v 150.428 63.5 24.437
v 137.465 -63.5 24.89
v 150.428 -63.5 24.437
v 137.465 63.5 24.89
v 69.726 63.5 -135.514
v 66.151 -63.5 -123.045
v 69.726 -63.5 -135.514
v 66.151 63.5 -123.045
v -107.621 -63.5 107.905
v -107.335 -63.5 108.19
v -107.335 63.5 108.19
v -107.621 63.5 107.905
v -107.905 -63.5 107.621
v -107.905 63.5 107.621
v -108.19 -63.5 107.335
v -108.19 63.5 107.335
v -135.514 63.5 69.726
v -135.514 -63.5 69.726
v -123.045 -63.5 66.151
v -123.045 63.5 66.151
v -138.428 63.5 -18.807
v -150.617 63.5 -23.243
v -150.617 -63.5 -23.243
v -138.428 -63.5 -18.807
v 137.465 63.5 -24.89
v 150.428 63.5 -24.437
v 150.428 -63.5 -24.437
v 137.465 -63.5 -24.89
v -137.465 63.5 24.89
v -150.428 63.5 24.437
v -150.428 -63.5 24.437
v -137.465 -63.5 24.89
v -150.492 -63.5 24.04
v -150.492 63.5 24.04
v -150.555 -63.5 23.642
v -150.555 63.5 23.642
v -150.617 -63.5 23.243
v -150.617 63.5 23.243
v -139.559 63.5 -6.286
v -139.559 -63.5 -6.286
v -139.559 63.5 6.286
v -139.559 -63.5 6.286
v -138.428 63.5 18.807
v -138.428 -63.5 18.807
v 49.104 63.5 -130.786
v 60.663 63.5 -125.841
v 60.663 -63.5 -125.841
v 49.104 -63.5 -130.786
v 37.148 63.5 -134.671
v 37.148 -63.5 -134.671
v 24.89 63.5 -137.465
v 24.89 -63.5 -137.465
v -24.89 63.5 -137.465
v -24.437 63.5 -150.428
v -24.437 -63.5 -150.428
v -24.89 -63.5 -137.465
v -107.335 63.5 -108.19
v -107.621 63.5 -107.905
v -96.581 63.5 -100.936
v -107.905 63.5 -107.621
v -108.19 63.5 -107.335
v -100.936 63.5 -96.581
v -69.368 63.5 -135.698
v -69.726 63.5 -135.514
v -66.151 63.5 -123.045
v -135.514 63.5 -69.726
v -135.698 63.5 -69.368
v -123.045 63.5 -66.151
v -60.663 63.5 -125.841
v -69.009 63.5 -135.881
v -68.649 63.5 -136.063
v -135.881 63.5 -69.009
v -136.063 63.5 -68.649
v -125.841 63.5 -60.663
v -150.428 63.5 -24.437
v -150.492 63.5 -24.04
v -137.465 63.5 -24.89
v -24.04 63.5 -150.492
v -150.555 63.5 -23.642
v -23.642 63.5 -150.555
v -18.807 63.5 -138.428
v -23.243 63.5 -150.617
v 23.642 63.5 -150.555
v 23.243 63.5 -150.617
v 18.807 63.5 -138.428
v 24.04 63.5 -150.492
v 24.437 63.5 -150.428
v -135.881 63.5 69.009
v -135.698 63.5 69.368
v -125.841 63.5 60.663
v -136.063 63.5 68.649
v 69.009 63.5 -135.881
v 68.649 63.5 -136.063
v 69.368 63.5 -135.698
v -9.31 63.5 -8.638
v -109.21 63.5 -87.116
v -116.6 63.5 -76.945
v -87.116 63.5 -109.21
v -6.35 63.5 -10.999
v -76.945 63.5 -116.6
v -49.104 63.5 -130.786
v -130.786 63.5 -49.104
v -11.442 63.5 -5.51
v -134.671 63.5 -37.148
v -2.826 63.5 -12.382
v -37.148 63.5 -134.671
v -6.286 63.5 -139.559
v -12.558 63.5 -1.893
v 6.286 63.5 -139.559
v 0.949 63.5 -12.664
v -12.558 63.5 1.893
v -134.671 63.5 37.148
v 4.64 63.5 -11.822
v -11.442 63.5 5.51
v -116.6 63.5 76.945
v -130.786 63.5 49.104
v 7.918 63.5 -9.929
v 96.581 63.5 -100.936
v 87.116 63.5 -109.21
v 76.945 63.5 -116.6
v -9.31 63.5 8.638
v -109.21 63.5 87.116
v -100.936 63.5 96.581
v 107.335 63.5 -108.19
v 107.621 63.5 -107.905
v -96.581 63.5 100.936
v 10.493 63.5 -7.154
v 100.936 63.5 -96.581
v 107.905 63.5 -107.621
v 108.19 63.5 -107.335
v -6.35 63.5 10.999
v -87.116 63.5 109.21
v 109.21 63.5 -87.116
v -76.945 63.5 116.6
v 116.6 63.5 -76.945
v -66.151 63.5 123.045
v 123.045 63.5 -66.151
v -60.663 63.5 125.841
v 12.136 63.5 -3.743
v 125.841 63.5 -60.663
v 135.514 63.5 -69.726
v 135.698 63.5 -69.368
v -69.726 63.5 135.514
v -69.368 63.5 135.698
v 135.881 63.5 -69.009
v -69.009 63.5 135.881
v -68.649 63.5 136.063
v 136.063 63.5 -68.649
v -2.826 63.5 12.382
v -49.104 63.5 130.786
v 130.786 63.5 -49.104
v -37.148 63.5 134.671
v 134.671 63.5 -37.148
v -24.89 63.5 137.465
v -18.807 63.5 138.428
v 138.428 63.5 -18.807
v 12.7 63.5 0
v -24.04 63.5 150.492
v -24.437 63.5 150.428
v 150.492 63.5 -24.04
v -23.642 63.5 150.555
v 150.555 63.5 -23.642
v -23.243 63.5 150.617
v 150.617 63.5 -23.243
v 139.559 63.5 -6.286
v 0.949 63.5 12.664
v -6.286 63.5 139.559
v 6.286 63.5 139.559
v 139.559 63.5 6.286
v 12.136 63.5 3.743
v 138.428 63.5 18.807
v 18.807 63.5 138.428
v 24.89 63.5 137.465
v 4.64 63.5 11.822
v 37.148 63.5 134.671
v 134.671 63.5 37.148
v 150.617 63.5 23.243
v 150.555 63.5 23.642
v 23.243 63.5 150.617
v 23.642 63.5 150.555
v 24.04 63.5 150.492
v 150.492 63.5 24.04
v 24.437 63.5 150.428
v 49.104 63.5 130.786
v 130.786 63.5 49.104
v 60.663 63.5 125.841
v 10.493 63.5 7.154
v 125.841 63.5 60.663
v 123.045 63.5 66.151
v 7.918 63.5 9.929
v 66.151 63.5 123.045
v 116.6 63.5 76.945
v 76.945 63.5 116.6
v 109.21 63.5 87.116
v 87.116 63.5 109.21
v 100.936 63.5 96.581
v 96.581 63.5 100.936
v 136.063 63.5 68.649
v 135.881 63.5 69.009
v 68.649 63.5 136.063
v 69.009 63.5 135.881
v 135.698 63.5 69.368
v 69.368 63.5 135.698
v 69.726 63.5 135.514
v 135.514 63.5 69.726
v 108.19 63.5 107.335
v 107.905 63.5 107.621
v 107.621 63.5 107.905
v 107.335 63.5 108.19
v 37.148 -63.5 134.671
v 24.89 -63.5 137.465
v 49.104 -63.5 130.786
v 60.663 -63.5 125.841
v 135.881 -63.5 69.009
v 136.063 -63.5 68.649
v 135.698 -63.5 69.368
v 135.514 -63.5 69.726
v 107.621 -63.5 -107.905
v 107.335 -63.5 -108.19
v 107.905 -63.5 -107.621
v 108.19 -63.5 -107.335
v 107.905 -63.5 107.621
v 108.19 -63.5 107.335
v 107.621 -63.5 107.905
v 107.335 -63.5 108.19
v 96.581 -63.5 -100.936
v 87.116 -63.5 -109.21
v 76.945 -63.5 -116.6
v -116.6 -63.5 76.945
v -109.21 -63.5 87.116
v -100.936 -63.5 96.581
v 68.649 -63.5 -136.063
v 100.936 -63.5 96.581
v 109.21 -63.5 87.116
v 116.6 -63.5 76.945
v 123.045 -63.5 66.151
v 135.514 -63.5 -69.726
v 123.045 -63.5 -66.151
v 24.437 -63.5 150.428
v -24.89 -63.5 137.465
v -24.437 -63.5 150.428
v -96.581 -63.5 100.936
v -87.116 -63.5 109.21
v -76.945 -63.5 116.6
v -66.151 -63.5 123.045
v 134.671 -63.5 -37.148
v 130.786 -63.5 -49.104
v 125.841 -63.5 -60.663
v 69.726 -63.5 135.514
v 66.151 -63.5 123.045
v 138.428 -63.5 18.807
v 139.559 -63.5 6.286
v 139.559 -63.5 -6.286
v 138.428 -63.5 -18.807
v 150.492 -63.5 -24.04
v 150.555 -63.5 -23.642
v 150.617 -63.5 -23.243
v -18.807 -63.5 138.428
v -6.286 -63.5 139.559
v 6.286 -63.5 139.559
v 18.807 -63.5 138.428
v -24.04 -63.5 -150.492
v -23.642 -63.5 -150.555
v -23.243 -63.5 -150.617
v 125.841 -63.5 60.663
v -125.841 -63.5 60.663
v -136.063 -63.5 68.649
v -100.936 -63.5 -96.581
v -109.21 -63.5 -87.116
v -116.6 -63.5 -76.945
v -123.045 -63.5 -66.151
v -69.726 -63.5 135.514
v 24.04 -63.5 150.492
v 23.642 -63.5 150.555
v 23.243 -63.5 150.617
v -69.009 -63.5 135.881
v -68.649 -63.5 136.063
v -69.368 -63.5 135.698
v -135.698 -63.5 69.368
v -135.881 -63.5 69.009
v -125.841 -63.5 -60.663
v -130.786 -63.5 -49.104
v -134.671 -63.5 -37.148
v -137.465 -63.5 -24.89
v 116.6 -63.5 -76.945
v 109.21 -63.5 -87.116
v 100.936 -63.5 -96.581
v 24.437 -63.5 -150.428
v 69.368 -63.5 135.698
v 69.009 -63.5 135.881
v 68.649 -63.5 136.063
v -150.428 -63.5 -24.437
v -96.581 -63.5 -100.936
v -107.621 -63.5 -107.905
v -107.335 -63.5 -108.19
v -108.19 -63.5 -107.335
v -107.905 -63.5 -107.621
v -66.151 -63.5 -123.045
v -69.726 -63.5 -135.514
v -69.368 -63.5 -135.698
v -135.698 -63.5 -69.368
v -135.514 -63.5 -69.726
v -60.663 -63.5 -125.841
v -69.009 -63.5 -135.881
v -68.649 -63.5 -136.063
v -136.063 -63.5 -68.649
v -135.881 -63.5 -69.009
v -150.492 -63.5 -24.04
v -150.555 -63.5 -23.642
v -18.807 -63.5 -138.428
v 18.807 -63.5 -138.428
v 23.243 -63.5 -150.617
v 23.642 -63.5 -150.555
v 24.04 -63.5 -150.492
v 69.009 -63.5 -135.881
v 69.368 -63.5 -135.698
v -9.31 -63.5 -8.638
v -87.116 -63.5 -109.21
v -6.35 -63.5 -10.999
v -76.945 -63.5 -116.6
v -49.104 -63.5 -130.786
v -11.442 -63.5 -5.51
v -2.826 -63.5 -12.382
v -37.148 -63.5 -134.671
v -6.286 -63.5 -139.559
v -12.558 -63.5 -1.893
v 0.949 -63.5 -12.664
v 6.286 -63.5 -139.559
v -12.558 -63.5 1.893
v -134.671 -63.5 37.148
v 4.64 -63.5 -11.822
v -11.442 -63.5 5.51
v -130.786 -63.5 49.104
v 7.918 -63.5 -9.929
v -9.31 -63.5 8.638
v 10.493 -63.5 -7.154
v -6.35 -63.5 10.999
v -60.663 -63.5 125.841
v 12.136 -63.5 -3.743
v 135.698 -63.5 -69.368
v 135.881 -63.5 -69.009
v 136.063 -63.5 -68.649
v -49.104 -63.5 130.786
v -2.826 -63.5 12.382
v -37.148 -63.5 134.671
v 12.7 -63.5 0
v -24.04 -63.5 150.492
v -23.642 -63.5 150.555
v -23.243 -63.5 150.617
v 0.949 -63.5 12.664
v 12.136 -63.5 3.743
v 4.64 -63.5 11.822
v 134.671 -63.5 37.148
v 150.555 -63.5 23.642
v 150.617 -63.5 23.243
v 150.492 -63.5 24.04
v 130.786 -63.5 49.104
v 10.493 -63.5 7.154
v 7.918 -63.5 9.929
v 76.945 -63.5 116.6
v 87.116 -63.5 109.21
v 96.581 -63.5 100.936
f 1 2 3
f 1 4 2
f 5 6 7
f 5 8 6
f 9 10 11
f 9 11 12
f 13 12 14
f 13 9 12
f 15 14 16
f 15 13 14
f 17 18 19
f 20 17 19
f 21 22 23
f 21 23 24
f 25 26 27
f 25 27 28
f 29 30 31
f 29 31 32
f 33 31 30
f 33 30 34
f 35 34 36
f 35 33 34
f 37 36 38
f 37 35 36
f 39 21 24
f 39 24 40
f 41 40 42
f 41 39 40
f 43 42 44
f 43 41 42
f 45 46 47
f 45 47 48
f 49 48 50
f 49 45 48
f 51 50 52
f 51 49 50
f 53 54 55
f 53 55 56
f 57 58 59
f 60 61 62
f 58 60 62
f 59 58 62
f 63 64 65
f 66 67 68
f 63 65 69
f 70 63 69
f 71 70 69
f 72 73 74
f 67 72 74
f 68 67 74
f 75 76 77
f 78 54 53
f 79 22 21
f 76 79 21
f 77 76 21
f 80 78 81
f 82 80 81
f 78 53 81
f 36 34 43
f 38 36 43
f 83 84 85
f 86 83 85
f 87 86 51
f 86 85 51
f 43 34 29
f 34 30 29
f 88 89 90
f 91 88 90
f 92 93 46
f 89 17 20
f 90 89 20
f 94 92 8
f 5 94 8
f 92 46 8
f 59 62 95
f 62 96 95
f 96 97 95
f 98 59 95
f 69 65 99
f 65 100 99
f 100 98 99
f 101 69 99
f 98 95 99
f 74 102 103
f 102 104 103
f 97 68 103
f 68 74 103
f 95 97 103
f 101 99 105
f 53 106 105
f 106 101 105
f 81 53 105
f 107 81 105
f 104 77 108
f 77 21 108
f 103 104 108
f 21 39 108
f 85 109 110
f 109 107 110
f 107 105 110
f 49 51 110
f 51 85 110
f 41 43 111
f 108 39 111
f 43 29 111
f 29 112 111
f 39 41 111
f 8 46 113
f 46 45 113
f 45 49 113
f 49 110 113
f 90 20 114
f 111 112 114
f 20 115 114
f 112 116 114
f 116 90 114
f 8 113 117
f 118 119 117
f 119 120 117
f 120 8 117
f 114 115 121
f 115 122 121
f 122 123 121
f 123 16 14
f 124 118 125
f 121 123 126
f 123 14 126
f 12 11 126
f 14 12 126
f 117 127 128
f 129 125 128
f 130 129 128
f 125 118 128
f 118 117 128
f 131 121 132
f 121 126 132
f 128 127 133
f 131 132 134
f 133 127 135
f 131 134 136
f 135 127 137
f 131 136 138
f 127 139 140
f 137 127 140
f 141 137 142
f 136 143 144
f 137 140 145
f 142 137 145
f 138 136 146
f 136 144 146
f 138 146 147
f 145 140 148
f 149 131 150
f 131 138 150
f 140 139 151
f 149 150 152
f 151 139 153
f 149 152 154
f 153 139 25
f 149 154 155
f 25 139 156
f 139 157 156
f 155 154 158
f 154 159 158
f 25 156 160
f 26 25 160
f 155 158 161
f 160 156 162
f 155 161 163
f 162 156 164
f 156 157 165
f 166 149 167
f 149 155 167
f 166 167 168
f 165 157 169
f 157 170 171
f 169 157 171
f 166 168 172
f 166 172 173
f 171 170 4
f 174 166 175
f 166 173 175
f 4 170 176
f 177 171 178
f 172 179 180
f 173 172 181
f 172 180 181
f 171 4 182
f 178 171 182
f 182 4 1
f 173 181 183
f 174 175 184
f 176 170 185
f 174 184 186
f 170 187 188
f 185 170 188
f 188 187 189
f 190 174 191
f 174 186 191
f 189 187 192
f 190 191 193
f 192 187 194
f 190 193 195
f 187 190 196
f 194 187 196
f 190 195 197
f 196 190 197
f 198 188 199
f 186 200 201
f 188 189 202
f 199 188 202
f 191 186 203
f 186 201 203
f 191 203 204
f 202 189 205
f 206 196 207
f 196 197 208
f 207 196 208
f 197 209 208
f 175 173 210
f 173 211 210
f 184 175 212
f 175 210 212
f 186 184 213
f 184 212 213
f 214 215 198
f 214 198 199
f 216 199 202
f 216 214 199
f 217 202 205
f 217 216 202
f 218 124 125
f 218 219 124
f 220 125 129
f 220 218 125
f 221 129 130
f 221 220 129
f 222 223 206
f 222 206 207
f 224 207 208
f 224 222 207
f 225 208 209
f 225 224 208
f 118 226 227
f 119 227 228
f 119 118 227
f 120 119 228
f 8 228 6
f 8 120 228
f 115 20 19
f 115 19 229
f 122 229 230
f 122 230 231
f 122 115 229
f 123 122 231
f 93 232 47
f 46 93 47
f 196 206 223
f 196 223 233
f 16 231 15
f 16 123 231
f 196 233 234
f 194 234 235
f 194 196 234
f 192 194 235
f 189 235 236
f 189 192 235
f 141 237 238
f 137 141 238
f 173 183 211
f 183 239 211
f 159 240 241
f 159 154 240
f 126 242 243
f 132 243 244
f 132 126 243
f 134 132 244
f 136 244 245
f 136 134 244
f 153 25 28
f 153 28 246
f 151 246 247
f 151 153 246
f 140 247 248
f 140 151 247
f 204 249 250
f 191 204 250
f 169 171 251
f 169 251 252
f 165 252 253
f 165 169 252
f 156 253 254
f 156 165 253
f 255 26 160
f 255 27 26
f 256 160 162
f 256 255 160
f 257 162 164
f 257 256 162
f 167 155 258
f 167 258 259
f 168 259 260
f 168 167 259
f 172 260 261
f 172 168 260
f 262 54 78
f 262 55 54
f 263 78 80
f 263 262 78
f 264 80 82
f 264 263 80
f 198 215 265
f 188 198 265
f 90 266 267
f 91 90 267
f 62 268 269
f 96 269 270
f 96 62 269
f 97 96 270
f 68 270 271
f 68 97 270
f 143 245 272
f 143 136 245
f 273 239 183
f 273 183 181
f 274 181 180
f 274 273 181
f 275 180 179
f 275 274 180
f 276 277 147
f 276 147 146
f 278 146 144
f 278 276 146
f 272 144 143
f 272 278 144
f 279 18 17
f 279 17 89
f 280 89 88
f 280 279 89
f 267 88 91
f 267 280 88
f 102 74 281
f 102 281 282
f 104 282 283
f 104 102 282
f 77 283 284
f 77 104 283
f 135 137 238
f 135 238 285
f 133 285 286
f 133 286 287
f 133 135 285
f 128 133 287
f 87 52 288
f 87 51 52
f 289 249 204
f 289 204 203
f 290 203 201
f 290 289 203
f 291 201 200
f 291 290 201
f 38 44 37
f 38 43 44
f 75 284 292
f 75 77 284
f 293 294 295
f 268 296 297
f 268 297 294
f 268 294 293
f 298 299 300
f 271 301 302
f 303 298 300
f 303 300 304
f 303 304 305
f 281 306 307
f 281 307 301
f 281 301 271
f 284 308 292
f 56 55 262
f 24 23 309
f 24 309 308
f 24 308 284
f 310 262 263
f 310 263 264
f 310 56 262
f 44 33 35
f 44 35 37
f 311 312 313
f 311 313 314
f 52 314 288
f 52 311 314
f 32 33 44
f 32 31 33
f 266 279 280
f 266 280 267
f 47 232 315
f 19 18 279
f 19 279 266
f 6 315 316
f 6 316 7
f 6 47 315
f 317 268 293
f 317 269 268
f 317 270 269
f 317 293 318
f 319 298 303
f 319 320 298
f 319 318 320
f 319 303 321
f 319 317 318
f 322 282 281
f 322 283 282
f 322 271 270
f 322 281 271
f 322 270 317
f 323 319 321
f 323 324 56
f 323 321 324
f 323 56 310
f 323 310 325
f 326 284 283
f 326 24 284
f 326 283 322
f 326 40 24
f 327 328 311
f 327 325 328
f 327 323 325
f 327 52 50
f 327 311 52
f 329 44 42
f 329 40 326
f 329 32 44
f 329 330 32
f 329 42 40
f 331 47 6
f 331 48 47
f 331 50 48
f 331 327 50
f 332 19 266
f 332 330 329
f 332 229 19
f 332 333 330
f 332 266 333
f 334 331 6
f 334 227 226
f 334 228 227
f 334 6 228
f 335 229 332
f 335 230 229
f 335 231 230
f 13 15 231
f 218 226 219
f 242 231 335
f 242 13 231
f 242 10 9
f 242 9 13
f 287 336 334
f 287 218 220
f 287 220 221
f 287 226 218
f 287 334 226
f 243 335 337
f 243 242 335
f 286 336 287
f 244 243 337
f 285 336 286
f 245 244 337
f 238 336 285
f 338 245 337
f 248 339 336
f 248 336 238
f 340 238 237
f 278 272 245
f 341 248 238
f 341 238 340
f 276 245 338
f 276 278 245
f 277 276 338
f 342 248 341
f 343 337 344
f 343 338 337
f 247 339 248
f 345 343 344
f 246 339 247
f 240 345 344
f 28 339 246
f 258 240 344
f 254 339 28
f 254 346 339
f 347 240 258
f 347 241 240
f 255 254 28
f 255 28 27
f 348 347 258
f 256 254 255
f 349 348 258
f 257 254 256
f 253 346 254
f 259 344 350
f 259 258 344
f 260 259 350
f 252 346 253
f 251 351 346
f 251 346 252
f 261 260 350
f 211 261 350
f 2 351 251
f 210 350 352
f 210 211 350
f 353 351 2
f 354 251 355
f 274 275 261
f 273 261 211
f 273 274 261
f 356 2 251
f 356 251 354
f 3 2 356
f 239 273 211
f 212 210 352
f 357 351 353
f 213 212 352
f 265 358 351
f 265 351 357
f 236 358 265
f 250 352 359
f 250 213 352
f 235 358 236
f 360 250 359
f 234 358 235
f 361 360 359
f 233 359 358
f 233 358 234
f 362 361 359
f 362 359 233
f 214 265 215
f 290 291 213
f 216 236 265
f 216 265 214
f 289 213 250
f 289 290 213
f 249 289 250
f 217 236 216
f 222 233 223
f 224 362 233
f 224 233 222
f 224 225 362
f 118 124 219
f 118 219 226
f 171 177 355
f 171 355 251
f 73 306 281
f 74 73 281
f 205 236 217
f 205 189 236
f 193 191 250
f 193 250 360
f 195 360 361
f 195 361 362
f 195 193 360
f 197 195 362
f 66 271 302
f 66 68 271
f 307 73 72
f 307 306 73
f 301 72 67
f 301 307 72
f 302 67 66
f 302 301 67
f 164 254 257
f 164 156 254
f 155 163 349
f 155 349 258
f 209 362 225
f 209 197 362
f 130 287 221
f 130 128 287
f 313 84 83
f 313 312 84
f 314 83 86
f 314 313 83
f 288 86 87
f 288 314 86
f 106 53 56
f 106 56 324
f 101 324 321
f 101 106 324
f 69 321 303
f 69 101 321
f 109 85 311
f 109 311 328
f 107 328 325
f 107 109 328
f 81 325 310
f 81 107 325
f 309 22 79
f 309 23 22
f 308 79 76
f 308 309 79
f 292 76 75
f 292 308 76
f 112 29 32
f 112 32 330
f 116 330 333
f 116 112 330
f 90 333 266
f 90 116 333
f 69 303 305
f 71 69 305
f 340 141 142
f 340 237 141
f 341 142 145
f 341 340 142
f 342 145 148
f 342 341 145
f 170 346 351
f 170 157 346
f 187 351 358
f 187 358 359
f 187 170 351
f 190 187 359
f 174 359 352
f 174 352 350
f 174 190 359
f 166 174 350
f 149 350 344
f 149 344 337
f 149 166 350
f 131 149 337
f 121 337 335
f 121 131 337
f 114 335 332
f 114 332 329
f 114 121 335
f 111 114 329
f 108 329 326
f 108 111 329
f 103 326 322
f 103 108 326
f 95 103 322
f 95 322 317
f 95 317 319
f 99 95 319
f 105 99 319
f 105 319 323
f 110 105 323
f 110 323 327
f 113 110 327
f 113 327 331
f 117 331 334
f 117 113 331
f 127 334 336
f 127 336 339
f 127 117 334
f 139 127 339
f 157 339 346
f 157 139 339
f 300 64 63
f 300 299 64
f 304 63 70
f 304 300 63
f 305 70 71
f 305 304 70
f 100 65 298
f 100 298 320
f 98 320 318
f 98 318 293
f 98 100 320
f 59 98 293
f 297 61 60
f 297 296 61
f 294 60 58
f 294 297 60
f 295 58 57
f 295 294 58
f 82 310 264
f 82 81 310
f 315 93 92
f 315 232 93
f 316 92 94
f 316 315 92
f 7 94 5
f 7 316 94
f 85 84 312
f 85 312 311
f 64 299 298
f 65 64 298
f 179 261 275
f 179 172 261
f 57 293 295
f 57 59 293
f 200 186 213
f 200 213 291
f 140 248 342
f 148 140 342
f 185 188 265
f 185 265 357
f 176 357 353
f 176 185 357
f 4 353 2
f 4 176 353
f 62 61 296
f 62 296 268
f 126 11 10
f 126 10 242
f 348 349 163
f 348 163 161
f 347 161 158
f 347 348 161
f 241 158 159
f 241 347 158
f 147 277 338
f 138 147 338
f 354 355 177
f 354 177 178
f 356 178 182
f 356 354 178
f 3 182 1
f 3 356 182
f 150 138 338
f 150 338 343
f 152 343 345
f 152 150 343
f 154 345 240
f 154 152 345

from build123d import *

# Parameters (mm, degrees)
F0_R     = 152.4
F0_R_2   = 76.2
F0_R_3   = 12.7
F1_DEPTH = 63.5
F3_DEPTH = 63.5


with BuildPart() as f1:
    # F0 (on Front) → F1 (new body, symmetric)
    with BuildSketch(Plane.XZ):
        Circle(F0_R)
        Circle(F0_R_2, mode=Mode.SUBTRACT)
        Circle(F0_R_2)
        Circle(F0_R_3, mode=Mode.SUBTRACT)
    extrude(amount=F1_DEPTH, both=True)

    # F2 (on Front) → F3 (cut, symmetric)
    with BuildSketch(Plane.XZ):
        with BuildLine():
            ThreePointArc((-18.8071139829, 138.4282574608), (0, 139.7), (18.8071139829, 138.4282574608))
            Line((18.8071139829, 138.4282574608), (23.2434776929, 150.6170665786))
            ThreePointArc((23.2434776929, 150.6170665786), (0, 152.4), (-23.2434776929, 150.6170665786))
            Line((-23.2434776929, 150.6170665786), (-18.8071139829, 138.4282574608))
        make_face()
        with BuildLine():
            ThreePointArc((-60.6633123632, 125.8413784616), (-43.1696741142, 132.8625953264), (-24.890055751, 137.4648141333))
            Line((-24.890055751, 137.4648141333), (-24.4373722945, 150.4279722503))
            ThreePointArc((-24.4373722945, 150.4279722503), (-47.0941899427, 144.9410130834), (-68.6490941369, 136.0627130194))
            Line((-68.6490941369, 136.0627130194), (-60.6633123632, 125.8413784616))
        make_face()
        with BuildLine():
            ThreePointArc((-96.5813630633, 100.9362685502), (-82.1135997453, 113.0196741142), (-66.1508134087, 123.0453570248))
            Line((-66.1508134087, 123.0453570248), (-69.7261220165, 135.5139399049))
            ThreePointArc((-69.7261220165, 135.5139399049), (-89.5784724494, 123.2941899427), (-107.3348589404, 108.1895931051))
            Line((-107.3348589404, 108.1895931051), (-96.5813630633, 100.9362685502))
        make_face()
        with BuildLine():
            ThreePointArc((-123.0453570248, 66.1508134087), (-113.0196741142, 82.1135997453), (-100.9362685502, 96.5813630633))
            Line((-100.9362685502, 96.5813630633), (-108.1895931051, 107.3348589404))
            ThreePointArc((-108.1895931051, 107.3348589404), (-123.2941899427, 89.5784724494), (-135.5139399049, 69.7261220165))
            Line((-135.5139399049, 69.7261220165), (-123.0453570248, 66.1508134087))
        make_face()
        with BuildLine():
            ThreePointArc((-137.4648141333, 24.890055751), (-132.8625953264, 43.1696741142), (-125.8413784616, 60.6633123632))
            Line((-125.8413784616, 60.6633123632), (-136.0627130194, 68.6490941369))
            ThreePointArc((-136.0627130194, 68.6490941369), (-144.9410130834, 47.0941899427), (-150.4279722503, 24.4373722945))
            Line((-150.4279722503, 24.4373722945), (-137.4648141333, 24.890055751))
        make_face()
        with BuildLine():
            ThreePointArc((-138.4282574608, -18.8071139829), (-139.7, 0), (-138.4282574608, 18.8071139829))
            Line((-138.4282574608, 18.8071139829), (-150.6170665786, 23.2434776929))
            ThreePointArc((-150.6170665786, 23.2434776929), (-152.4, 0), (-150.6170665786, -23.2434776929))
            Line((-150.6170665786, -23.2434776929), (-138.4282574608, -18.8071139829))
        make_face()
        with BuildLine():
            ThreePointArc((-125.8413784616, -60.6633123632), (-132.8625953264, -43.1696741142), (-137.4648141333, -24.890055751))
            Line((-137.4648141333, -24.890055751), (-150.4279722503, -24.4373722945))
            ThreePointArc((-150.4279722503, -24.4373722945), (-144.9410130834, -47.0941899427), (-136.0627130194, -68.6490941369))
            Line((-136.0627130194, -68.6490941369), (-125.8413784616, -60.6633123632))
        make_face()
        with BuildLine():
            ThreePointArc((-100.9362685502, -96.5813630633), (-113.0196741142, -82.1135997453), (-123.0453570248, -66.1508134087))
            Line((-123.0453570248, -66.1508134087), (-135.5139399049, -69.7261220165))
            ThreePointArc((-135.5139399049, -69.7261220165), (-123.2941899427, -89.5784724494), (-108.1895931051, -107.3348589404))
            Line((-108.1895931051, -107.3348589404), (-100.9362685502, -96.5813630633))
        make_face()
        with BuildLine():
            ThreePointArc((-66.1508134087, -123.0453570248), (-82.1135997453, -113.0196741142), (-96.5813630633, -100.9362685502))
            Line((-96.5813630633, -100.9362685502), (-107.3348589404, -108.1895931051))
            ThreePointArc((-107.3348589404, -108.1895931051), (-89.5784724494, -123.2941899427), (-69.7261220165, -135.5139399049))
            Line((-69.7261220165, -135.5139399049), (-66.1508134087, -123.0453570248))
        make_face()
        with BuildLine():
            ThreePointArc((-24.890055751, -137.4648141333), (-43.1696741142, -132.8625953264), (-60.6633123632, -125.8413784616))
            Line((-60.6633123632, -125.8413784616), (-68.6490941369, -136.0627130194))
            ThreePointArc((-68.6490941369, -136.0627130194), (-47.0941899427, -144.9410130834), (-24.4373722945, -150.4279722503))
            Line((-24.4373722945, -150.4279722503), (-24.890055751, -137.4648141333))
        make_face()
        with BuildLine():
            ThreePointArc((18.8071139829, -138.4282574608), (0, -139.7), (-18.8071139829, -138.4282574608))
            Line((-18.8071139829, -138.4282574608), (-23.2434776929, -150.6170665786))
            ThreePointArc((-23.2434776929, -150.6170665786), (0, -152.4), (23.2434776929, -150.6170665786))
            Line((23.2434776929, -150.6170665786), (18.8071139829, -138.4282574608))
        make_face()
        with BuildLine():
            ThreePointArc((60.6633123632, -125.8413784616), (43.1696741142, -132.8625953264), (24.890055751, -137.4648141333))
            Line((24.890055751, -137.4648141333), (24.4373722945, -150.4279722503))
            ThreePointArc((24.4373722945, -150.4279722503), (47.0941899427, -144.9410130834), (68.6490941369, -136.0627130194))
            Line((68.6490941369, -136.0627130194), (60.6633123632, -125.8413784616))
        make_face()
        with BuildLine():
            ThreePointArc((96.5813630633, -100.9362685502), (82.1135997453, -113.0196741142), (66.1508134087, -123.0453570248))
            Line((66.1508134087, -123.0453570248), (69.7261220165, -135.5139399049))
            ThreePointArc((69.7261220165, -135.5139399049), (89.5784724494, -123.2941899427), (107.3348589404, -108.1895931051))
            Line((107.3348589404, -108.1895931051), (96.5813630633, -100.9362685502))
        make_face()
        with BuildLine():
            ThreePointArc((123.0453570248, -66.1508134087), (113.0196741142, -82.1135997453), (100.9362685502, -96.5813630633))
            Line((100.9362685502, -96.5813630633), (108.1895931051, -107.3348589404))
            ThreePointArc((108.1895931051, -107.3348589404), (123.2941899427, -89.5784724494), (135.5139399049, -69.7261220165))
            Line((135.5139399049, -69.7261220165), (123.0453570248, -66.1508134087))
        make_face()
        with BuildLine():
            ThreePointArc((137.4648141333, -24.890055751), (132.8625953264, -43.1696741142), (125.8413784616, -60.6633123632))
            Line((125.8413784616, -60.6633123632), (136.0627130194, -68.6490941369))
            ThreePointArc((136.0627130194, -68.6490941369), (144.9410130834, -47.0941899427), (150.4279722503, -24.4373722945))
            Line((150.4279722503, -24.4373722945), (137.4648141333, -24.890055751))
        make_face()
        with BuildLine():
            ThreePointArc((138.4282574608, 18.8071139829), (139.7, 0), (138.4282574608, -18.8071139829))
            Line((138.4282574608, -18.8071139829), (150.6170665786, -23.2434776929))
            ThreePointArc((150.6170665786, -23.2434776929), (152.4, 0), (150.6170665786, 23.2434776929))
            Line((150.6170665786, 23.2434776929), (138.4282574608, 18.8071139829))
        make_face()
        with BuildLine():
            ThreePointArc((125.8413784616, 60.6633123632), (132.8625953264, 43.1696741142), (137.4648141333, 24.890055751))
            Line((137.4648141333, 24.890055751), (150.4279722503, 24.4373722945))
            ThreePointArc((150.4279722503, 24.4373722945), (144.9410130834, 47.0941899427), (136.0627130194, 68.6490941369))
            Line((136.0627130194, 68.6490941369), (125.8413784616, 60.6633123632))
        make_face()
        with BuildLine():
            ThreePointArc((100.9362685502, 96.5813630633), (113.0196741142, 82.1135997453), (123.0453570248, 66.1508134087))
            Line((123.0453570248, 66.1508134087), (135.5139399049, 69.7261220165))
            ThreePointArc((135.5139399049, 69.7261220165), (123.2941899427, 89.5784724494), (108.1895931051, 107.3348589404))
            Line((108.1895931051, 107.3348589404), (100.9362685502, 96.5813630633))
        make_face()
        with BuildLine():
            ThreePointArc((66.1508134087, 123.0453570248), (82.1135997453, 113.0196741142), (96.5813630633, 100.9362685502))
            Line((96.5813630633, 100.9362685502), (107.3348589404, 108.1895931051))
            ThreePointArc((107.3348589404, 108.1895931051), (89.5784724494, 123.2941899427), (69.7261220165, 135.5139399049))
            Line((69.7261220165, 135.5139399049), (66.1508134087, 123.0453570248))
        make_face()
        with BuildLine():
            ThreePointArc((24.890055751, 137.4648141333), (43.1696741142, 132.8625953264), (60.6633123632, 125.8413784616))
            Line((60.6633123632, 125.8413784616), (68.6490941369, 136.0627130194))
            ThreePointArc((68.6490941369, 136.0627130194), (47.0941899427, 144.9410130834), (24.4373722945, 150.4279722503))
            Line((24.4373722945, 150.4279722503), (24.890055751, 137.4648141333))
        make_face()
    extrude(amount=F3_DEPTH, both=True, mode=Mode.SUBTRACT)


solid = f1.part
